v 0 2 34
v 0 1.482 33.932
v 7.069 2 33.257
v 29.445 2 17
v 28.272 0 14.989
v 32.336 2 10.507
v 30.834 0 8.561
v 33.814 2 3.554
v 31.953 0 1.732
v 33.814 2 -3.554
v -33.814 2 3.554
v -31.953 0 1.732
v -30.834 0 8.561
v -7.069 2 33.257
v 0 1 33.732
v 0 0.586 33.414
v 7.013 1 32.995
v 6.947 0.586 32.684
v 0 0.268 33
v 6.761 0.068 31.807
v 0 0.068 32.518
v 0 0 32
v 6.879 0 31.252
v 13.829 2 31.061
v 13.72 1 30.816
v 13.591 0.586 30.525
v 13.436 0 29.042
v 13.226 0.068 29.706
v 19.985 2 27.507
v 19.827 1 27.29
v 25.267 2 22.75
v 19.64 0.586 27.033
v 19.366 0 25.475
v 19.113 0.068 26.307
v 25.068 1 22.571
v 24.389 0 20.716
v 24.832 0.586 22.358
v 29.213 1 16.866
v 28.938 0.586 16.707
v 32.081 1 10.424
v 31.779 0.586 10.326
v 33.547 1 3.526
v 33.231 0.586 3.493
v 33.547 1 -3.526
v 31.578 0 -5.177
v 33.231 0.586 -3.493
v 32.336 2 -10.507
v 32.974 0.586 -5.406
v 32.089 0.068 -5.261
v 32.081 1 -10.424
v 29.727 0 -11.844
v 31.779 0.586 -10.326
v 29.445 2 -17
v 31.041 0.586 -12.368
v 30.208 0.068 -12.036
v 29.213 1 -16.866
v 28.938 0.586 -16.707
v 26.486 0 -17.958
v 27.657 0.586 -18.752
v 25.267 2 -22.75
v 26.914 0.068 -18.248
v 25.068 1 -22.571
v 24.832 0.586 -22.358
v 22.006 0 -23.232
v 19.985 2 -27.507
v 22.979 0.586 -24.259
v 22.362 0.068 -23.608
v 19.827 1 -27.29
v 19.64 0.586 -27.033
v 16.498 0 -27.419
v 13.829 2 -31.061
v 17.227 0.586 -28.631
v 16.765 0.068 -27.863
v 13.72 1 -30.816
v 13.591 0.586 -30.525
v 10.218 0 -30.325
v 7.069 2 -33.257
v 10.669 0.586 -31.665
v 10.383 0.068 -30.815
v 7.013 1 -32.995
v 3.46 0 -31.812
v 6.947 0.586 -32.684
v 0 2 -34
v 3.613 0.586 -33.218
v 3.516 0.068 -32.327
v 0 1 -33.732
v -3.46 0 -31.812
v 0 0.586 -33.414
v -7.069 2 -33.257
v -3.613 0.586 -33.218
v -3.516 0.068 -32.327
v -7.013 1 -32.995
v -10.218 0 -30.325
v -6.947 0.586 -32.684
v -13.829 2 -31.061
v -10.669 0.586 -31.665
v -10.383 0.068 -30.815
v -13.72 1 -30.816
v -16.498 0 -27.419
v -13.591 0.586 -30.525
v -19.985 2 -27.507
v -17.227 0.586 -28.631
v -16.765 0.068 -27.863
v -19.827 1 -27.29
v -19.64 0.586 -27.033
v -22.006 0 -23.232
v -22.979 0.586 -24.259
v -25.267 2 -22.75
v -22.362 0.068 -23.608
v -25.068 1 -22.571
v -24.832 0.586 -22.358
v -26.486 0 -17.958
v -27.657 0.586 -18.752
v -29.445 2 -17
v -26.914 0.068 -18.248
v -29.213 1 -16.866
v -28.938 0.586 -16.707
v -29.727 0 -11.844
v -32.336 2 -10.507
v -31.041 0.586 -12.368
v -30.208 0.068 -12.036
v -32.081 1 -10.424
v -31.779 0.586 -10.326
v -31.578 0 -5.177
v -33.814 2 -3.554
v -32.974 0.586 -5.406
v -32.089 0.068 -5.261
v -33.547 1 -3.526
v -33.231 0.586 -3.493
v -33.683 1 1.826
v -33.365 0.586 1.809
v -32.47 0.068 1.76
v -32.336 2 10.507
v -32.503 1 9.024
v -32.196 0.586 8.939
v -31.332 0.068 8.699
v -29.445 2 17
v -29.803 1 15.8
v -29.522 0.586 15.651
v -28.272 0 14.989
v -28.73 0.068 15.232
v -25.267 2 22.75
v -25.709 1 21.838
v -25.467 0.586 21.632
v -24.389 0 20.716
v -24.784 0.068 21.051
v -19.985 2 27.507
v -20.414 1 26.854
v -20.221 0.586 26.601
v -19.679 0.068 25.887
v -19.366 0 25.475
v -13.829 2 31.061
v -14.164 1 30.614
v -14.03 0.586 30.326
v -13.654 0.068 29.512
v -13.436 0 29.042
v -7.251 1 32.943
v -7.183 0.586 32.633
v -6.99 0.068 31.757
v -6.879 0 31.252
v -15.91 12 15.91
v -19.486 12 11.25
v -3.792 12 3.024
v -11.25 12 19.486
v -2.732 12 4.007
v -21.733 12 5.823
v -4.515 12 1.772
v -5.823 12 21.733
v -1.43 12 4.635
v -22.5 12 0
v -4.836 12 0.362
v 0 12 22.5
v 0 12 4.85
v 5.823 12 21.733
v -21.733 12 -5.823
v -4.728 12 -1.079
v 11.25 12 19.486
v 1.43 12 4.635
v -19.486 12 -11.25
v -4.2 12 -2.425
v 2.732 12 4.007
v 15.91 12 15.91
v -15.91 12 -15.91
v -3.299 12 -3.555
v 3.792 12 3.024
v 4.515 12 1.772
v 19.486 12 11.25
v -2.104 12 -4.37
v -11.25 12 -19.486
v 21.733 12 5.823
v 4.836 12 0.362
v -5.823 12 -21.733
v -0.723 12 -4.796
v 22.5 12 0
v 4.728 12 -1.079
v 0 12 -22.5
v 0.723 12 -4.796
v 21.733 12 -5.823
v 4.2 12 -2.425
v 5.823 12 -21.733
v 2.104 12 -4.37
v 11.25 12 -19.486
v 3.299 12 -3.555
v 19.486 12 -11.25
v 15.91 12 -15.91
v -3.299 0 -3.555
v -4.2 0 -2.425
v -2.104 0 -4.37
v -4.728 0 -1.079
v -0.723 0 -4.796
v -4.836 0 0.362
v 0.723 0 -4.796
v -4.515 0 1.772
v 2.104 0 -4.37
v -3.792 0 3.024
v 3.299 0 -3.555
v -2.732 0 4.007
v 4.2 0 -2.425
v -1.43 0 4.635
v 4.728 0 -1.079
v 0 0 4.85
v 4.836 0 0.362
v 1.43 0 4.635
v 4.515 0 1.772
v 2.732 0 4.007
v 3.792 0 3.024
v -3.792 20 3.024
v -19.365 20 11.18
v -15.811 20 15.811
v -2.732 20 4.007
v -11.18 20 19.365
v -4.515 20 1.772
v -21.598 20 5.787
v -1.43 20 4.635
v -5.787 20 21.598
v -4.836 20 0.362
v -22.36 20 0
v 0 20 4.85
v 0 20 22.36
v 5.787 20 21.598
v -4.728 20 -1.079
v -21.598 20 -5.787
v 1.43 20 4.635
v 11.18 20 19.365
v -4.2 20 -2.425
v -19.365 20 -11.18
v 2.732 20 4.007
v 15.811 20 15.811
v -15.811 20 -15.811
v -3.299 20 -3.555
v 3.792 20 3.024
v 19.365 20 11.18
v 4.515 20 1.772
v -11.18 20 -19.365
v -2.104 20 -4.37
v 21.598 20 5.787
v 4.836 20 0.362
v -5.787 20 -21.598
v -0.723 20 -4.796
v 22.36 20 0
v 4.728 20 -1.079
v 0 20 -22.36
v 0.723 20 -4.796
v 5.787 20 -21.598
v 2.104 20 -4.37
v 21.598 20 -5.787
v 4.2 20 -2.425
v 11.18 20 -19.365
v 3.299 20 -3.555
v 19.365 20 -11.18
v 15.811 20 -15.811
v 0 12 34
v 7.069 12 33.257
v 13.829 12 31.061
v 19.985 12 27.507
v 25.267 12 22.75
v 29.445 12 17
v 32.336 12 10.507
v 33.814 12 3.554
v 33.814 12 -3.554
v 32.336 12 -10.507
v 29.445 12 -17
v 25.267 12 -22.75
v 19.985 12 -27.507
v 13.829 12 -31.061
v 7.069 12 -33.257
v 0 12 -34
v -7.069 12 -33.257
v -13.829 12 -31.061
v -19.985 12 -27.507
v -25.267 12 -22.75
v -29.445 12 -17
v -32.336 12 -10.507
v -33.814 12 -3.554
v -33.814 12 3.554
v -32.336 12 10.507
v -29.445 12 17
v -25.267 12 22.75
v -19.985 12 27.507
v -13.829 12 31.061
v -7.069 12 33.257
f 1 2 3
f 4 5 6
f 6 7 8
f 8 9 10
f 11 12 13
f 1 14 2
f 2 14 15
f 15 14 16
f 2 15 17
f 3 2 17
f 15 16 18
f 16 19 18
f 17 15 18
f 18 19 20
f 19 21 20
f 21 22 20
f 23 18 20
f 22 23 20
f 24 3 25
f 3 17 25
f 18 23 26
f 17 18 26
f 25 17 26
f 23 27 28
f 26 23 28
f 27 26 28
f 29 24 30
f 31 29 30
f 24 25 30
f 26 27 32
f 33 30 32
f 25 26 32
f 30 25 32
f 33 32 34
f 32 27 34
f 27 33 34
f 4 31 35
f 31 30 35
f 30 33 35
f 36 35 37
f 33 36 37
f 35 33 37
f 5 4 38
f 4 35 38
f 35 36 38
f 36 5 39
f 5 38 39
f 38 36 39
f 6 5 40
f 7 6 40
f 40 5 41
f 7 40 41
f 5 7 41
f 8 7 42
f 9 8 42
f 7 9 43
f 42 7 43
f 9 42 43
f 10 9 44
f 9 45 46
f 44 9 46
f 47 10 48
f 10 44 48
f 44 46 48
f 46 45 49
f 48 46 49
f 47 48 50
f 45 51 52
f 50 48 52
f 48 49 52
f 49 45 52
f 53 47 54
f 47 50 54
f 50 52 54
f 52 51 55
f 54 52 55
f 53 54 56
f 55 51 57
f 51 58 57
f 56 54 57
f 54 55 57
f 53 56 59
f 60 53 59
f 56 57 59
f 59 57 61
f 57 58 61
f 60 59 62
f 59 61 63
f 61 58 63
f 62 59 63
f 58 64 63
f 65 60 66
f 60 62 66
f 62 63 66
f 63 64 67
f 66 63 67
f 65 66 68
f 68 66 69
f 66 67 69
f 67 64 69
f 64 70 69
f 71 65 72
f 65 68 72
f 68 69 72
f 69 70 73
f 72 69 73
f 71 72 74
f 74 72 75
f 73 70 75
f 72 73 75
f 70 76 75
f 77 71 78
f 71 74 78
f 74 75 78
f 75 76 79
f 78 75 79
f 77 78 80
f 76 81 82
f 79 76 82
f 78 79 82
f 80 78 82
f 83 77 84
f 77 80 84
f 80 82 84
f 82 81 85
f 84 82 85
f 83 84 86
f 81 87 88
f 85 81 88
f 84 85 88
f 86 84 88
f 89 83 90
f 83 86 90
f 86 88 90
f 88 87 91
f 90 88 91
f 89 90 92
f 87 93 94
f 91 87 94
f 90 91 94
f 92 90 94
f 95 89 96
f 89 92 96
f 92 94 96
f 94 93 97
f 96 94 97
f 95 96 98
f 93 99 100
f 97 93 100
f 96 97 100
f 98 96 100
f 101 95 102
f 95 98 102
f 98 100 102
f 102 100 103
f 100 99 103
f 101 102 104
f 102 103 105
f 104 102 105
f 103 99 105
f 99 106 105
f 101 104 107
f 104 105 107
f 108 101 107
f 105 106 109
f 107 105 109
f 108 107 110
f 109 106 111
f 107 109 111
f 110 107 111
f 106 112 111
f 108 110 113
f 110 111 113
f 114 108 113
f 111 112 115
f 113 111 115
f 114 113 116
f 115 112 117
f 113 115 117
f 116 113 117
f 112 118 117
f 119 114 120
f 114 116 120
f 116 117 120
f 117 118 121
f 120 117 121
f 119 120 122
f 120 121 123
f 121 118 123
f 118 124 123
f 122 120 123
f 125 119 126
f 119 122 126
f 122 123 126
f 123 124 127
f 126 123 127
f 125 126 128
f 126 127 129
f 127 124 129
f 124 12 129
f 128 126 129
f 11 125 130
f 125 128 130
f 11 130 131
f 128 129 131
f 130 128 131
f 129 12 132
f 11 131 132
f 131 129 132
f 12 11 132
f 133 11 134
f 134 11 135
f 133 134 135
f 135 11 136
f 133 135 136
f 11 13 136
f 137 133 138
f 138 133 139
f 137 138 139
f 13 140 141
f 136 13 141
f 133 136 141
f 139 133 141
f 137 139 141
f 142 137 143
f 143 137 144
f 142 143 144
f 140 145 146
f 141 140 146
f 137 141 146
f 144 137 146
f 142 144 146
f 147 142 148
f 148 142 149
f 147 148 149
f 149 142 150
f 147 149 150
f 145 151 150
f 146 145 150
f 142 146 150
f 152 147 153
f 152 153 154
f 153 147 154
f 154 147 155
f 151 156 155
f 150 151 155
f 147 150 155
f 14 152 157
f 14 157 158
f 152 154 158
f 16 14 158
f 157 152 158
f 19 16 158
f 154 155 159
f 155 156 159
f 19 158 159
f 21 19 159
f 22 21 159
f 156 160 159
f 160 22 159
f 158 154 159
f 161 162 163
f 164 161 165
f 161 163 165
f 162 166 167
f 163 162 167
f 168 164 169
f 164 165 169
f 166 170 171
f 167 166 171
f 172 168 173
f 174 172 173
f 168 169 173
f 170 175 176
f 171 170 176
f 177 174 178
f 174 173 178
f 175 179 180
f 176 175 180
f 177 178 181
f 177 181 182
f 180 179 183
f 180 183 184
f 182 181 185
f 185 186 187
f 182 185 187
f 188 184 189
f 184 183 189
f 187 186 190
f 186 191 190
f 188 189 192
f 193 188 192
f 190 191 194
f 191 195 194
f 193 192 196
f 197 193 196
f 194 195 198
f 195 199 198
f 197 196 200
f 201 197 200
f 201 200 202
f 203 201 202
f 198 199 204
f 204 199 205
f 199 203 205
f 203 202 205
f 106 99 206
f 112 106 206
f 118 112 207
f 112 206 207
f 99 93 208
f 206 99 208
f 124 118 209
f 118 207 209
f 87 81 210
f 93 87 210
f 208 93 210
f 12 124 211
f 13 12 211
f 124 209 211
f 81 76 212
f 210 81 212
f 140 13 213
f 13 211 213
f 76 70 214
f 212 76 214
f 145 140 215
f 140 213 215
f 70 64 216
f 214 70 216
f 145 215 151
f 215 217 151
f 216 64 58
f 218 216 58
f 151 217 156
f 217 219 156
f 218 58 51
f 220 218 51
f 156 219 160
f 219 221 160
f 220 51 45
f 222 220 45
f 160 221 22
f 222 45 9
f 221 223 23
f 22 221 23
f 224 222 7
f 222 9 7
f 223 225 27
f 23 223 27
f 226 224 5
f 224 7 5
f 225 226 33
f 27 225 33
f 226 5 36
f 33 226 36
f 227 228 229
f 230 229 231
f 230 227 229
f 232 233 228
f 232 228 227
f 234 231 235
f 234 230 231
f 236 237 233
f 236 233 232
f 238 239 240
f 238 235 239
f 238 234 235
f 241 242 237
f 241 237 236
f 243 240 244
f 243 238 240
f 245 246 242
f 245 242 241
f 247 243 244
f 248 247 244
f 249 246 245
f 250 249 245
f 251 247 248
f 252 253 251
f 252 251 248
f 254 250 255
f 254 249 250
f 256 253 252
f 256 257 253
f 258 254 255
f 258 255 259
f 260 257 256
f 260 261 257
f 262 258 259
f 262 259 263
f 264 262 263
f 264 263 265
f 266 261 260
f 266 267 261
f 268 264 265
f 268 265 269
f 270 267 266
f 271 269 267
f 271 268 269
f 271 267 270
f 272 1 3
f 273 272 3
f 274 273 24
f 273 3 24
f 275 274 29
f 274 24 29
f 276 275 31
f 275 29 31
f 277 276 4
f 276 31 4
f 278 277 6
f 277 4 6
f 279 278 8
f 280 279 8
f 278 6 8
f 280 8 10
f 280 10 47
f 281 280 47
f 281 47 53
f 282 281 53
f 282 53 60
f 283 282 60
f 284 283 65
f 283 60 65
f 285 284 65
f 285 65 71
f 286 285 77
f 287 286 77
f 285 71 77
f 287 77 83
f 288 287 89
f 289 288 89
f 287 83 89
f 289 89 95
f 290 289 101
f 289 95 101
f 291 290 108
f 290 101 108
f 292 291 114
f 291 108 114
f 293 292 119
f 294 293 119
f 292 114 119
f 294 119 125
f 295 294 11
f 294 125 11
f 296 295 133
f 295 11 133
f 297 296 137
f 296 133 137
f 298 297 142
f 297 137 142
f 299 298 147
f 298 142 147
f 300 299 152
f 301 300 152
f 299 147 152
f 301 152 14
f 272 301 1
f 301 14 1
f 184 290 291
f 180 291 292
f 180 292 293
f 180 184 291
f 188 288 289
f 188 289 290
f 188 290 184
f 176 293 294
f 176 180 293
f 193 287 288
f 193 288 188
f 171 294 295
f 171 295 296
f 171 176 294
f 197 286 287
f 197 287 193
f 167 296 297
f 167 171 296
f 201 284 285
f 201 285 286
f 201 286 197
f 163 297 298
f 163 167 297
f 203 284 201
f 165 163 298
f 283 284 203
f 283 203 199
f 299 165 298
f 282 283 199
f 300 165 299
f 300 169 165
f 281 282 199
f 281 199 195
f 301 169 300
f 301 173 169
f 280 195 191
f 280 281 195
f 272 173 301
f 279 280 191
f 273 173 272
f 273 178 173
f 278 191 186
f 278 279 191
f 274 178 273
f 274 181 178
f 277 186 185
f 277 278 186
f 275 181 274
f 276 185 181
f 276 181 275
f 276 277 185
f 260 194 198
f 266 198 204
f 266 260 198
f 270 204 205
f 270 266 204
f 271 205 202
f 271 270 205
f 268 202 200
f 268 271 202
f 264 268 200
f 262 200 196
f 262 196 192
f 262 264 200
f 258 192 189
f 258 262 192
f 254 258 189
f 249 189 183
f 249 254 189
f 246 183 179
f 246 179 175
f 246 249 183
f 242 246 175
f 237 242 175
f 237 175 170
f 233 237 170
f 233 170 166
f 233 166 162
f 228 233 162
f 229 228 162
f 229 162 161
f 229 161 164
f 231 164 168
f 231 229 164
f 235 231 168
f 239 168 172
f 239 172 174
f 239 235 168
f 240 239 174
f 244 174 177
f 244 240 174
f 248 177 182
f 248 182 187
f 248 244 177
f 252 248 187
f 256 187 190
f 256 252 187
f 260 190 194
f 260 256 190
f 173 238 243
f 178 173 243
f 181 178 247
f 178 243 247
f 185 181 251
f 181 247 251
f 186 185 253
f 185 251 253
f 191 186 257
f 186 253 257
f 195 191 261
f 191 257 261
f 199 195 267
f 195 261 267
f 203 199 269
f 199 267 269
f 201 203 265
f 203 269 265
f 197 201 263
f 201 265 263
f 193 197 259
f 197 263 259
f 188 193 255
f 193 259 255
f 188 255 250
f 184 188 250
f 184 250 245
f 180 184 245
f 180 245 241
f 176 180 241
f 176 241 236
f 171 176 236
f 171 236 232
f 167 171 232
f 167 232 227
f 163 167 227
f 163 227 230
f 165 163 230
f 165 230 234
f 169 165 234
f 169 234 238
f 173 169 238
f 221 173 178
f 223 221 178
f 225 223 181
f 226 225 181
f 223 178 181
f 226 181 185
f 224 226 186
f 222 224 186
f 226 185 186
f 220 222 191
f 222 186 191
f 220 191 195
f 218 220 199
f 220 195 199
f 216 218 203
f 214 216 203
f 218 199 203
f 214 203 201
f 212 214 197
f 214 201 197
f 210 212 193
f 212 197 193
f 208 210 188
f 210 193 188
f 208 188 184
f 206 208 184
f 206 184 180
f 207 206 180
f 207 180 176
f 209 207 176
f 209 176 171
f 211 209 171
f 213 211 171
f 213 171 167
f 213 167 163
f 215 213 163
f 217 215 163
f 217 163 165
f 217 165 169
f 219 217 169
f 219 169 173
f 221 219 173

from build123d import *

# Parameters (mm, degrees)
SKETCH2_R           = 34
BOSS_EXTRUDE1_DEPTH = 12
SKETCH3_R           = 22.5
BOSS_EXTRUDE3_DEPTH = 8
BOSS_EXTRUDE3_TAPER = 1
SKETCH4_R           = 4.85
CUT_EXTRUDE1_DEPTH  = 53.076866265
FILLET1_R           = 2


with BuildPart() as part:
    # Sketch2 → Boss-Extrude1 (new body)
    with BuildSketch(Plane(origin=(0, 0, 0), x_dir=(1, 0, 0), z_dir=(0, 1, 0))):
        with Locations(Location((0, 0, 0), (0, 0, 270))):
            Circle(SKETCH2_R)
    extrude(amount=BOSS_EXTRUDE1_DEPTH)


with BuildPart() as body_2:
    # Sketch3 → Boss-Extrude3 (new body)
    with BuildSketch(Plane(origin=(0, 12, 0), x_dir=(1, 0, 0), z_dir=(0, 1, 0))):
        Circle(SKETCH3_R)
    extrude(amount=BOSS_EXTRUDE3_DEPTH, taper=BOSS_EXTRUDE3_TAPER)


with BuildPart() as cut_extrude1_tool:
    # Sketch4 → Cut-Extrude1 (new, through all)
    with BuildSketch(Plane(origin=(0, 20, 0), x_dir=(1, 0, 0), z_dir=(0, 1, 0))):
        with Locations(Location((0, 0, 0), (0, 0, 270))):
            Circle(SKETCH4_R)
    extrude(amount=-CUT_EXTRUDE1_DEPTH)


with BuildPart() as part_1:
    add(part.part)

    # Cut-Extrude1: cut by cut_extrude1_tool
    add(cut_extrude1_tool.part, mode=Mode.SUBTRACT)

    # Fillet1
    fillet1_edges = [part_1.edges().sort_by_distance(p)[0] for p in [
        (0, 0, -34),
    ]]
    fillet(fillet1_edges, radius=FILLET1_R)


with BuildPart() as body_2_1:
    add(body_2.part)

    # Cut-Extrude1: cut by cut_extrude1_tool
    add(cut_extrude1_tool.part, mode=Mode.SUBTRACT)


solid = Compound([part_1.part, body_2_1.part])
